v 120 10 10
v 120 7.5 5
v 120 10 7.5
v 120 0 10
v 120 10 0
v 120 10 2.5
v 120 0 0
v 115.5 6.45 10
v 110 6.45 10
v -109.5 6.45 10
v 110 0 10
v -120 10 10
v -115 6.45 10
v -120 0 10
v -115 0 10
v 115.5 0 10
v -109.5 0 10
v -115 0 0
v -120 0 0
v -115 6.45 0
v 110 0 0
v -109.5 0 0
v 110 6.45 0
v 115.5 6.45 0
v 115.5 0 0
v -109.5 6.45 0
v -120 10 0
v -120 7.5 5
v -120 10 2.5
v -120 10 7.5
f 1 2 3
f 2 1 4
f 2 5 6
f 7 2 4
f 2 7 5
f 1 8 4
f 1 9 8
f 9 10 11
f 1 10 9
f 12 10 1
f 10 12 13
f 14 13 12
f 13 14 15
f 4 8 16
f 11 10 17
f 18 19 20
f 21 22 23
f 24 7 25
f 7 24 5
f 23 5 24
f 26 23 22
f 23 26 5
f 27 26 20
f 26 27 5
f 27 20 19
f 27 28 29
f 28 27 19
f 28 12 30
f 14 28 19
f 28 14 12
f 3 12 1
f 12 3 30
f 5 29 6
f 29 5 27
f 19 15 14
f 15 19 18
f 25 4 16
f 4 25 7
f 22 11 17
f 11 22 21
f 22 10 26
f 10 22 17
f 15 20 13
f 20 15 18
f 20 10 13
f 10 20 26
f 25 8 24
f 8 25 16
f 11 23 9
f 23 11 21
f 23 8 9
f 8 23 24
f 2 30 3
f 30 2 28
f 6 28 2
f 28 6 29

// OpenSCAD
// file: clip.scad
EPSILON=.05;
TOLERANCE=.5;

bagW=140;
slotO=5;
slotW=5;
slotD=6;
slotAssemblyW=2*slotO*slotW;

clipW=2*slotAssemblyW + bagW;
clipD=10;
clipH=10;

notchOpening=5;
notchOpeningH=clipH - 2*notchOpening;
notchSide=sqrt(notchOpening*notchOpening/2);

gapD=2;

lockW=slotW - TOLERANCE;
lockD=2*clipD+gapD;
lockH=2*clipH;
lockHoleD=2*(clipD-slotD)+gapD+EPSILON+TOLERANCE;

module slot(eps, tol) {
    translate([-slotW/2,
               -slotD/2,
               -eps])
        cube([slotW+tol, 
              slotD+tol, 
              clipH+2*eps]);
}

module unnotched() {
    difference() {
        translate([-clipW/2, 0, 0]) {
            cube([clipW, clipD, clipH]);
        }
        translate([-(clipW/2-slotW/2-slotO), slotD/2-EPSILON, 0]) {
            slot(eps=EPSILON, tol=TOLERANCE);
        }
        translate([(clipW/2-slotW/2-slotO), slotD/2-EPSILON, 0]) {
            slot(eps=EPSILON, tol=TOLERANCE);
        }
    }
}

module notch(eps=EPSILON) {
    translate([0, clipD, clipH/2]) {
        rotate([45, 0, 0]) {
            cube([clipW+eps, notchSide, notchSide], center=true);
        }
    }
}

module negative() {
    difference() {
        unnotched();
        notch();
    }
}

module positive() {
    union() {
        unnotched();
        notch(eps=0);
    }
}

module lock() {
    difference() {
        cube([lockW, lockD, lockH]);
        translate([-EPSILON, (lockD-lockHoleD)/2, -EPSILON]) {
            cube([lockW+2*EPSILON,
                  lockHoleD,
                  clipH+EPSILON]);
        }
    }
}

previewGapD=gapD/2;

npreviewX=0;
npreviewY=-clipD-previewGapD;
npreviewZ=0;

ppreviewX=0;
ppreviewY=clipD+previewGapD;
ppreviewZ=0;

lpreviewX=-clipW/2+slotO;
lpreviewY=-(clipD + gapD/2);
lpreviewZ=1.1*clipH+EPSILON;

if ($preview) {
    translate([npreviewX, npreviewY, npreviewZ]) {
        negative();
    }
    translate([ppreviewX, ppreviewY, ppreviewZ]) {
        translate([0, 0, clipH]) {
            rotate([180, 0, 0]) {
                positive();
            }
        }
    }
    translate([lpreviewX, lpreviewY, lpreviewZ]) {
        lock();
    }
}

//
// This program is free software: you can redistribute it and/or modify it 
// under the terms of the GNU General Public License as published by the 
// Free Software Foundation, either version 3 of the License, or (at your option) any later version.
//
// This program is distributed in the hope that it will be useful, but 
// WITHOUT ANY WARRANTY; without even the implied warranty of 
// MERCHANTABILITY or FITNESS FOR A PARTICULAR PURPOSE. 
// See the GNU General Public License for more details.
//
// You should have received a copy of the GNU General Public License 
// along with this program. If not, see <https://www.gnu.org/licenses/>.
//
// main file
include <clip.scad>

negative();

//
// This program is free software: you can redistribute it and/or modify it 
// under the terms of the GNU General Public License as published by the 
// Free Software Foundation, either version 3 of the License, or (at your option) any later version.
//
// This program is distributed in the hope that it will be useful, but 
// WITHOUT ANY WARRANTY; without even the implied warranty of 
// MERCHANTABILITY or FITNESS FOR A PARTICULAR PURPOSE. 
// See the GNU General Public License for more details.
//
// You should have received a copy of the GNU General Public License 
// along with this program. If not, see <https://www.gnu.org/licenses/>.
//
